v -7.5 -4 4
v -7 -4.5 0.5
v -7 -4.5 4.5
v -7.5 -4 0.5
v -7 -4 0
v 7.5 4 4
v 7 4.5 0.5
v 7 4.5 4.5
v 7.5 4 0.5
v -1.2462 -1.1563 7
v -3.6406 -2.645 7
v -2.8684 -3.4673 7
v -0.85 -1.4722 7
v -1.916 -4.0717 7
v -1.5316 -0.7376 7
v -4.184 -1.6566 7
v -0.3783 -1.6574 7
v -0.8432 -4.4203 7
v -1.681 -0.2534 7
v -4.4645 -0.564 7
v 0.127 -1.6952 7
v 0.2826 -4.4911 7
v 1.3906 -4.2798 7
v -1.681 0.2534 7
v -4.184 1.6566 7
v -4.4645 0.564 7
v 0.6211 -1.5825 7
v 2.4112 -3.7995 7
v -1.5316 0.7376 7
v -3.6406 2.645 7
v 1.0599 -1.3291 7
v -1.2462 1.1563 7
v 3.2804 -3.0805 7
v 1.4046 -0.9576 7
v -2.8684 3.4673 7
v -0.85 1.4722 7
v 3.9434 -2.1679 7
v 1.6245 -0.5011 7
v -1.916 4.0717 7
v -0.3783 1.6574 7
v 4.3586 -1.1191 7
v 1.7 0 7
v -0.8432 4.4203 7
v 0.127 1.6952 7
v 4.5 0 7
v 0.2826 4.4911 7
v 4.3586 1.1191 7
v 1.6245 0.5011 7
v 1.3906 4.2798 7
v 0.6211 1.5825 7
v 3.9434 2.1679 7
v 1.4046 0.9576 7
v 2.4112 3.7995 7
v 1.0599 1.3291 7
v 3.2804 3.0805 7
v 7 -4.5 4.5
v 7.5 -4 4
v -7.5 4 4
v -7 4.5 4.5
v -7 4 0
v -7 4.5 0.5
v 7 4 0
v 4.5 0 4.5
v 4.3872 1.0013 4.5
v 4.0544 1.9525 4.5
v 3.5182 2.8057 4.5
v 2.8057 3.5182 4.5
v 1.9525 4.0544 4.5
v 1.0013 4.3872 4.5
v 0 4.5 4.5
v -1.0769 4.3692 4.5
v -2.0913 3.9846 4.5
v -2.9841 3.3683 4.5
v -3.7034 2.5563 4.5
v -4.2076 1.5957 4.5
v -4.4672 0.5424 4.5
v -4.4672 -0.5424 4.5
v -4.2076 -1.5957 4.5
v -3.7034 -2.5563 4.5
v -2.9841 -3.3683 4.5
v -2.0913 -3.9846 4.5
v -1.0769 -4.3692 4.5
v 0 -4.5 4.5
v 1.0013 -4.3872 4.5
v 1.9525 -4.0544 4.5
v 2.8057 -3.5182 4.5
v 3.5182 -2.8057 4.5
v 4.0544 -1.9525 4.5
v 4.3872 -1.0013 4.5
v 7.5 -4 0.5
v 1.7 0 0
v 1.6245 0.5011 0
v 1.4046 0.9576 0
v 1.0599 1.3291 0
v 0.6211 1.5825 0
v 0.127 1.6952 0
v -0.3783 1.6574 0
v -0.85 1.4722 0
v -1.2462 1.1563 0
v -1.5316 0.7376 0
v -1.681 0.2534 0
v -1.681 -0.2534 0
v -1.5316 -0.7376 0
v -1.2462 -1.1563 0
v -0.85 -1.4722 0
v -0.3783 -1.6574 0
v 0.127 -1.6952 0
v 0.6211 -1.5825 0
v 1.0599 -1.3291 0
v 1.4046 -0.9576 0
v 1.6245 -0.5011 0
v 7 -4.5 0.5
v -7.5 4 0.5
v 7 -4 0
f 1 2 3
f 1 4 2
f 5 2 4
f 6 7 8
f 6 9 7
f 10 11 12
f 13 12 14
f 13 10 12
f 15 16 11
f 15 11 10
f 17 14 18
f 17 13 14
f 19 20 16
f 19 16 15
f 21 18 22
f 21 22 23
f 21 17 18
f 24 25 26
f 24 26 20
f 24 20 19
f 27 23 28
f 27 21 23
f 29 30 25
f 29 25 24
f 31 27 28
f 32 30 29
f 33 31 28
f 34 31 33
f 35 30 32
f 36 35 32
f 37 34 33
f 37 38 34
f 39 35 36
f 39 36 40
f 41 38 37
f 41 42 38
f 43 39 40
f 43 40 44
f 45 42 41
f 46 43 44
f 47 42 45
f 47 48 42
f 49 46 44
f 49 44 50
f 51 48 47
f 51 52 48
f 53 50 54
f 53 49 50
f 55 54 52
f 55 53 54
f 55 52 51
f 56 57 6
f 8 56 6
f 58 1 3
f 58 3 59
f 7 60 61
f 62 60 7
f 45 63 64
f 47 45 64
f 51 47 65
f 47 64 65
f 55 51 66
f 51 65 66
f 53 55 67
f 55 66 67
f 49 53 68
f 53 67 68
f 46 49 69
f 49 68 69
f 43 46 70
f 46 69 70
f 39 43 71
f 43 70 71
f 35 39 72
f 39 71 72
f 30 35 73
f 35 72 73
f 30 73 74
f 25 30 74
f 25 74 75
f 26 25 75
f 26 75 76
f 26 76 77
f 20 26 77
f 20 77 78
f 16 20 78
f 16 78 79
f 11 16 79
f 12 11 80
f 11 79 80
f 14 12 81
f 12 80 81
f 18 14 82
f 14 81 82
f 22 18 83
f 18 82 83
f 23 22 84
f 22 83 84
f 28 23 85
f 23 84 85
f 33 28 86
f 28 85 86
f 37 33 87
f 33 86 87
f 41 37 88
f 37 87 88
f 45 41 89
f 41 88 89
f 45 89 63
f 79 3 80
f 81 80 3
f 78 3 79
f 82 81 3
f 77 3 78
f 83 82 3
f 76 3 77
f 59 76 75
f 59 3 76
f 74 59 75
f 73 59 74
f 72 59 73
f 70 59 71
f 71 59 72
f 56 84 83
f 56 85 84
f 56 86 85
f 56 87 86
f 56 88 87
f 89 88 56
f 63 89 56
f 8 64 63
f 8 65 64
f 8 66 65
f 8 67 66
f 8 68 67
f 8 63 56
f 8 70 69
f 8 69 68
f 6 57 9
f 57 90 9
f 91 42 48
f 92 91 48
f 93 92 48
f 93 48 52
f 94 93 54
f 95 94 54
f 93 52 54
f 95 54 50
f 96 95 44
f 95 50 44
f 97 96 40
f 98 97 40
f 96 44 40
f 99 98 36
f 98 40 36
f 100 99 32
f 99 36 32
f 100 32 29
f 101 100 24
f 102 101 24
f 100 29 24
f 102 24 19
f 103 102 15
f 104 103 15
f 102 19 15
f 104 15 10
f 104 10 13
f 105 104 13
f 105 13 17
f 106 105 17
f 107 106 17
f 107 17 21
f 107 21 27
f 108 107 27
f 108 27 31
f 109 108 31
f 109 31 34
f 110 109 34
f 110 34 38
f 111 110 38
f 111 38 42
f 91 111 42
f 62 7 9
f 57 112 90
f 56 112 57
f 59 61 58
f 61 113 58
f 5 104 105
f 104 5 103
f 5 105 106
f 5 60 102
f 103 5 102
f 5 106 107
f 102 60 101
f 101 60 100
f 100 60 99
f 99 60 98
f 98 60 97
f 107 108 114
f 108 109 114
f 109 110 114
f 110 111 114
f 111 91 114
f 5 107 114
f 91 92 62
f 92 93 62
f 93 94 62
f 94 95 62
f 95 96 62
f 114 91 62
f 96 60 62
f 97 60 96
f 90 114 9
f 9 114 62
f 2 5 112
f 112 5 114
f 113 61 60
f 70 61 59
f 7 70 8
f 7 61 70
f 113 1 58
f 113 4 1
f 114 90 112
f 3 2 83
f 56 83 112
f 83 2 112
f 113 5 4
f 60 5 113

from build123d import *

# Parameters (mm, degrees)
F0_W     = 15
F0_H     = 9
F1_DEPTH = 4.5
F2_R     = 4.5
F3_DEPTH = 2.5
F4_R     = 1.7
F5_DEPTH = 7.001
F6_SIZE  = 0.5


with BuildPart() as f1:
    # F0 (on Top) → F1 (new body)
    with BuildSketch(Plane.XY):
        Rectangle(F0_W, F0_H)
    extrude(amount=F1_DEPTH)

    # F2 (on face) → F3 (join)
    with BuildSketch(Plane.XY.offset(4.5)):
        Circle(F2_R)
    extrude(amount=F3_DEPTH)

    # F4 (on face) → F5 (cut, through all)
    with BuildSketch(Plane.XY.offset(7)):
        Circle(F4_R)
    extrude(amount=-F5_DEPTH, mode=Mode.SUBTRACT)

    # F6
    f6_edges = [f1.edges().sort_by_distance(p)[0] for p in [
        (-7.5, 0, 4.5),
        (7.5, 0, 4.5),
        (-7.5, -4.5, 2.25),
        (-7.5, 4.5, 2.25),
        (7.5, -4.5, 2.25),
        (7.5, 4.5, 2.25),
        (0, 4.5, 0),
        (7.5, 0, 0),
        (0, -4.5, 0),
        (-7.5, 0, 0),
    ]]
    chamfer(f6_edges, length=F6_SIZE)


solid = f1.part
